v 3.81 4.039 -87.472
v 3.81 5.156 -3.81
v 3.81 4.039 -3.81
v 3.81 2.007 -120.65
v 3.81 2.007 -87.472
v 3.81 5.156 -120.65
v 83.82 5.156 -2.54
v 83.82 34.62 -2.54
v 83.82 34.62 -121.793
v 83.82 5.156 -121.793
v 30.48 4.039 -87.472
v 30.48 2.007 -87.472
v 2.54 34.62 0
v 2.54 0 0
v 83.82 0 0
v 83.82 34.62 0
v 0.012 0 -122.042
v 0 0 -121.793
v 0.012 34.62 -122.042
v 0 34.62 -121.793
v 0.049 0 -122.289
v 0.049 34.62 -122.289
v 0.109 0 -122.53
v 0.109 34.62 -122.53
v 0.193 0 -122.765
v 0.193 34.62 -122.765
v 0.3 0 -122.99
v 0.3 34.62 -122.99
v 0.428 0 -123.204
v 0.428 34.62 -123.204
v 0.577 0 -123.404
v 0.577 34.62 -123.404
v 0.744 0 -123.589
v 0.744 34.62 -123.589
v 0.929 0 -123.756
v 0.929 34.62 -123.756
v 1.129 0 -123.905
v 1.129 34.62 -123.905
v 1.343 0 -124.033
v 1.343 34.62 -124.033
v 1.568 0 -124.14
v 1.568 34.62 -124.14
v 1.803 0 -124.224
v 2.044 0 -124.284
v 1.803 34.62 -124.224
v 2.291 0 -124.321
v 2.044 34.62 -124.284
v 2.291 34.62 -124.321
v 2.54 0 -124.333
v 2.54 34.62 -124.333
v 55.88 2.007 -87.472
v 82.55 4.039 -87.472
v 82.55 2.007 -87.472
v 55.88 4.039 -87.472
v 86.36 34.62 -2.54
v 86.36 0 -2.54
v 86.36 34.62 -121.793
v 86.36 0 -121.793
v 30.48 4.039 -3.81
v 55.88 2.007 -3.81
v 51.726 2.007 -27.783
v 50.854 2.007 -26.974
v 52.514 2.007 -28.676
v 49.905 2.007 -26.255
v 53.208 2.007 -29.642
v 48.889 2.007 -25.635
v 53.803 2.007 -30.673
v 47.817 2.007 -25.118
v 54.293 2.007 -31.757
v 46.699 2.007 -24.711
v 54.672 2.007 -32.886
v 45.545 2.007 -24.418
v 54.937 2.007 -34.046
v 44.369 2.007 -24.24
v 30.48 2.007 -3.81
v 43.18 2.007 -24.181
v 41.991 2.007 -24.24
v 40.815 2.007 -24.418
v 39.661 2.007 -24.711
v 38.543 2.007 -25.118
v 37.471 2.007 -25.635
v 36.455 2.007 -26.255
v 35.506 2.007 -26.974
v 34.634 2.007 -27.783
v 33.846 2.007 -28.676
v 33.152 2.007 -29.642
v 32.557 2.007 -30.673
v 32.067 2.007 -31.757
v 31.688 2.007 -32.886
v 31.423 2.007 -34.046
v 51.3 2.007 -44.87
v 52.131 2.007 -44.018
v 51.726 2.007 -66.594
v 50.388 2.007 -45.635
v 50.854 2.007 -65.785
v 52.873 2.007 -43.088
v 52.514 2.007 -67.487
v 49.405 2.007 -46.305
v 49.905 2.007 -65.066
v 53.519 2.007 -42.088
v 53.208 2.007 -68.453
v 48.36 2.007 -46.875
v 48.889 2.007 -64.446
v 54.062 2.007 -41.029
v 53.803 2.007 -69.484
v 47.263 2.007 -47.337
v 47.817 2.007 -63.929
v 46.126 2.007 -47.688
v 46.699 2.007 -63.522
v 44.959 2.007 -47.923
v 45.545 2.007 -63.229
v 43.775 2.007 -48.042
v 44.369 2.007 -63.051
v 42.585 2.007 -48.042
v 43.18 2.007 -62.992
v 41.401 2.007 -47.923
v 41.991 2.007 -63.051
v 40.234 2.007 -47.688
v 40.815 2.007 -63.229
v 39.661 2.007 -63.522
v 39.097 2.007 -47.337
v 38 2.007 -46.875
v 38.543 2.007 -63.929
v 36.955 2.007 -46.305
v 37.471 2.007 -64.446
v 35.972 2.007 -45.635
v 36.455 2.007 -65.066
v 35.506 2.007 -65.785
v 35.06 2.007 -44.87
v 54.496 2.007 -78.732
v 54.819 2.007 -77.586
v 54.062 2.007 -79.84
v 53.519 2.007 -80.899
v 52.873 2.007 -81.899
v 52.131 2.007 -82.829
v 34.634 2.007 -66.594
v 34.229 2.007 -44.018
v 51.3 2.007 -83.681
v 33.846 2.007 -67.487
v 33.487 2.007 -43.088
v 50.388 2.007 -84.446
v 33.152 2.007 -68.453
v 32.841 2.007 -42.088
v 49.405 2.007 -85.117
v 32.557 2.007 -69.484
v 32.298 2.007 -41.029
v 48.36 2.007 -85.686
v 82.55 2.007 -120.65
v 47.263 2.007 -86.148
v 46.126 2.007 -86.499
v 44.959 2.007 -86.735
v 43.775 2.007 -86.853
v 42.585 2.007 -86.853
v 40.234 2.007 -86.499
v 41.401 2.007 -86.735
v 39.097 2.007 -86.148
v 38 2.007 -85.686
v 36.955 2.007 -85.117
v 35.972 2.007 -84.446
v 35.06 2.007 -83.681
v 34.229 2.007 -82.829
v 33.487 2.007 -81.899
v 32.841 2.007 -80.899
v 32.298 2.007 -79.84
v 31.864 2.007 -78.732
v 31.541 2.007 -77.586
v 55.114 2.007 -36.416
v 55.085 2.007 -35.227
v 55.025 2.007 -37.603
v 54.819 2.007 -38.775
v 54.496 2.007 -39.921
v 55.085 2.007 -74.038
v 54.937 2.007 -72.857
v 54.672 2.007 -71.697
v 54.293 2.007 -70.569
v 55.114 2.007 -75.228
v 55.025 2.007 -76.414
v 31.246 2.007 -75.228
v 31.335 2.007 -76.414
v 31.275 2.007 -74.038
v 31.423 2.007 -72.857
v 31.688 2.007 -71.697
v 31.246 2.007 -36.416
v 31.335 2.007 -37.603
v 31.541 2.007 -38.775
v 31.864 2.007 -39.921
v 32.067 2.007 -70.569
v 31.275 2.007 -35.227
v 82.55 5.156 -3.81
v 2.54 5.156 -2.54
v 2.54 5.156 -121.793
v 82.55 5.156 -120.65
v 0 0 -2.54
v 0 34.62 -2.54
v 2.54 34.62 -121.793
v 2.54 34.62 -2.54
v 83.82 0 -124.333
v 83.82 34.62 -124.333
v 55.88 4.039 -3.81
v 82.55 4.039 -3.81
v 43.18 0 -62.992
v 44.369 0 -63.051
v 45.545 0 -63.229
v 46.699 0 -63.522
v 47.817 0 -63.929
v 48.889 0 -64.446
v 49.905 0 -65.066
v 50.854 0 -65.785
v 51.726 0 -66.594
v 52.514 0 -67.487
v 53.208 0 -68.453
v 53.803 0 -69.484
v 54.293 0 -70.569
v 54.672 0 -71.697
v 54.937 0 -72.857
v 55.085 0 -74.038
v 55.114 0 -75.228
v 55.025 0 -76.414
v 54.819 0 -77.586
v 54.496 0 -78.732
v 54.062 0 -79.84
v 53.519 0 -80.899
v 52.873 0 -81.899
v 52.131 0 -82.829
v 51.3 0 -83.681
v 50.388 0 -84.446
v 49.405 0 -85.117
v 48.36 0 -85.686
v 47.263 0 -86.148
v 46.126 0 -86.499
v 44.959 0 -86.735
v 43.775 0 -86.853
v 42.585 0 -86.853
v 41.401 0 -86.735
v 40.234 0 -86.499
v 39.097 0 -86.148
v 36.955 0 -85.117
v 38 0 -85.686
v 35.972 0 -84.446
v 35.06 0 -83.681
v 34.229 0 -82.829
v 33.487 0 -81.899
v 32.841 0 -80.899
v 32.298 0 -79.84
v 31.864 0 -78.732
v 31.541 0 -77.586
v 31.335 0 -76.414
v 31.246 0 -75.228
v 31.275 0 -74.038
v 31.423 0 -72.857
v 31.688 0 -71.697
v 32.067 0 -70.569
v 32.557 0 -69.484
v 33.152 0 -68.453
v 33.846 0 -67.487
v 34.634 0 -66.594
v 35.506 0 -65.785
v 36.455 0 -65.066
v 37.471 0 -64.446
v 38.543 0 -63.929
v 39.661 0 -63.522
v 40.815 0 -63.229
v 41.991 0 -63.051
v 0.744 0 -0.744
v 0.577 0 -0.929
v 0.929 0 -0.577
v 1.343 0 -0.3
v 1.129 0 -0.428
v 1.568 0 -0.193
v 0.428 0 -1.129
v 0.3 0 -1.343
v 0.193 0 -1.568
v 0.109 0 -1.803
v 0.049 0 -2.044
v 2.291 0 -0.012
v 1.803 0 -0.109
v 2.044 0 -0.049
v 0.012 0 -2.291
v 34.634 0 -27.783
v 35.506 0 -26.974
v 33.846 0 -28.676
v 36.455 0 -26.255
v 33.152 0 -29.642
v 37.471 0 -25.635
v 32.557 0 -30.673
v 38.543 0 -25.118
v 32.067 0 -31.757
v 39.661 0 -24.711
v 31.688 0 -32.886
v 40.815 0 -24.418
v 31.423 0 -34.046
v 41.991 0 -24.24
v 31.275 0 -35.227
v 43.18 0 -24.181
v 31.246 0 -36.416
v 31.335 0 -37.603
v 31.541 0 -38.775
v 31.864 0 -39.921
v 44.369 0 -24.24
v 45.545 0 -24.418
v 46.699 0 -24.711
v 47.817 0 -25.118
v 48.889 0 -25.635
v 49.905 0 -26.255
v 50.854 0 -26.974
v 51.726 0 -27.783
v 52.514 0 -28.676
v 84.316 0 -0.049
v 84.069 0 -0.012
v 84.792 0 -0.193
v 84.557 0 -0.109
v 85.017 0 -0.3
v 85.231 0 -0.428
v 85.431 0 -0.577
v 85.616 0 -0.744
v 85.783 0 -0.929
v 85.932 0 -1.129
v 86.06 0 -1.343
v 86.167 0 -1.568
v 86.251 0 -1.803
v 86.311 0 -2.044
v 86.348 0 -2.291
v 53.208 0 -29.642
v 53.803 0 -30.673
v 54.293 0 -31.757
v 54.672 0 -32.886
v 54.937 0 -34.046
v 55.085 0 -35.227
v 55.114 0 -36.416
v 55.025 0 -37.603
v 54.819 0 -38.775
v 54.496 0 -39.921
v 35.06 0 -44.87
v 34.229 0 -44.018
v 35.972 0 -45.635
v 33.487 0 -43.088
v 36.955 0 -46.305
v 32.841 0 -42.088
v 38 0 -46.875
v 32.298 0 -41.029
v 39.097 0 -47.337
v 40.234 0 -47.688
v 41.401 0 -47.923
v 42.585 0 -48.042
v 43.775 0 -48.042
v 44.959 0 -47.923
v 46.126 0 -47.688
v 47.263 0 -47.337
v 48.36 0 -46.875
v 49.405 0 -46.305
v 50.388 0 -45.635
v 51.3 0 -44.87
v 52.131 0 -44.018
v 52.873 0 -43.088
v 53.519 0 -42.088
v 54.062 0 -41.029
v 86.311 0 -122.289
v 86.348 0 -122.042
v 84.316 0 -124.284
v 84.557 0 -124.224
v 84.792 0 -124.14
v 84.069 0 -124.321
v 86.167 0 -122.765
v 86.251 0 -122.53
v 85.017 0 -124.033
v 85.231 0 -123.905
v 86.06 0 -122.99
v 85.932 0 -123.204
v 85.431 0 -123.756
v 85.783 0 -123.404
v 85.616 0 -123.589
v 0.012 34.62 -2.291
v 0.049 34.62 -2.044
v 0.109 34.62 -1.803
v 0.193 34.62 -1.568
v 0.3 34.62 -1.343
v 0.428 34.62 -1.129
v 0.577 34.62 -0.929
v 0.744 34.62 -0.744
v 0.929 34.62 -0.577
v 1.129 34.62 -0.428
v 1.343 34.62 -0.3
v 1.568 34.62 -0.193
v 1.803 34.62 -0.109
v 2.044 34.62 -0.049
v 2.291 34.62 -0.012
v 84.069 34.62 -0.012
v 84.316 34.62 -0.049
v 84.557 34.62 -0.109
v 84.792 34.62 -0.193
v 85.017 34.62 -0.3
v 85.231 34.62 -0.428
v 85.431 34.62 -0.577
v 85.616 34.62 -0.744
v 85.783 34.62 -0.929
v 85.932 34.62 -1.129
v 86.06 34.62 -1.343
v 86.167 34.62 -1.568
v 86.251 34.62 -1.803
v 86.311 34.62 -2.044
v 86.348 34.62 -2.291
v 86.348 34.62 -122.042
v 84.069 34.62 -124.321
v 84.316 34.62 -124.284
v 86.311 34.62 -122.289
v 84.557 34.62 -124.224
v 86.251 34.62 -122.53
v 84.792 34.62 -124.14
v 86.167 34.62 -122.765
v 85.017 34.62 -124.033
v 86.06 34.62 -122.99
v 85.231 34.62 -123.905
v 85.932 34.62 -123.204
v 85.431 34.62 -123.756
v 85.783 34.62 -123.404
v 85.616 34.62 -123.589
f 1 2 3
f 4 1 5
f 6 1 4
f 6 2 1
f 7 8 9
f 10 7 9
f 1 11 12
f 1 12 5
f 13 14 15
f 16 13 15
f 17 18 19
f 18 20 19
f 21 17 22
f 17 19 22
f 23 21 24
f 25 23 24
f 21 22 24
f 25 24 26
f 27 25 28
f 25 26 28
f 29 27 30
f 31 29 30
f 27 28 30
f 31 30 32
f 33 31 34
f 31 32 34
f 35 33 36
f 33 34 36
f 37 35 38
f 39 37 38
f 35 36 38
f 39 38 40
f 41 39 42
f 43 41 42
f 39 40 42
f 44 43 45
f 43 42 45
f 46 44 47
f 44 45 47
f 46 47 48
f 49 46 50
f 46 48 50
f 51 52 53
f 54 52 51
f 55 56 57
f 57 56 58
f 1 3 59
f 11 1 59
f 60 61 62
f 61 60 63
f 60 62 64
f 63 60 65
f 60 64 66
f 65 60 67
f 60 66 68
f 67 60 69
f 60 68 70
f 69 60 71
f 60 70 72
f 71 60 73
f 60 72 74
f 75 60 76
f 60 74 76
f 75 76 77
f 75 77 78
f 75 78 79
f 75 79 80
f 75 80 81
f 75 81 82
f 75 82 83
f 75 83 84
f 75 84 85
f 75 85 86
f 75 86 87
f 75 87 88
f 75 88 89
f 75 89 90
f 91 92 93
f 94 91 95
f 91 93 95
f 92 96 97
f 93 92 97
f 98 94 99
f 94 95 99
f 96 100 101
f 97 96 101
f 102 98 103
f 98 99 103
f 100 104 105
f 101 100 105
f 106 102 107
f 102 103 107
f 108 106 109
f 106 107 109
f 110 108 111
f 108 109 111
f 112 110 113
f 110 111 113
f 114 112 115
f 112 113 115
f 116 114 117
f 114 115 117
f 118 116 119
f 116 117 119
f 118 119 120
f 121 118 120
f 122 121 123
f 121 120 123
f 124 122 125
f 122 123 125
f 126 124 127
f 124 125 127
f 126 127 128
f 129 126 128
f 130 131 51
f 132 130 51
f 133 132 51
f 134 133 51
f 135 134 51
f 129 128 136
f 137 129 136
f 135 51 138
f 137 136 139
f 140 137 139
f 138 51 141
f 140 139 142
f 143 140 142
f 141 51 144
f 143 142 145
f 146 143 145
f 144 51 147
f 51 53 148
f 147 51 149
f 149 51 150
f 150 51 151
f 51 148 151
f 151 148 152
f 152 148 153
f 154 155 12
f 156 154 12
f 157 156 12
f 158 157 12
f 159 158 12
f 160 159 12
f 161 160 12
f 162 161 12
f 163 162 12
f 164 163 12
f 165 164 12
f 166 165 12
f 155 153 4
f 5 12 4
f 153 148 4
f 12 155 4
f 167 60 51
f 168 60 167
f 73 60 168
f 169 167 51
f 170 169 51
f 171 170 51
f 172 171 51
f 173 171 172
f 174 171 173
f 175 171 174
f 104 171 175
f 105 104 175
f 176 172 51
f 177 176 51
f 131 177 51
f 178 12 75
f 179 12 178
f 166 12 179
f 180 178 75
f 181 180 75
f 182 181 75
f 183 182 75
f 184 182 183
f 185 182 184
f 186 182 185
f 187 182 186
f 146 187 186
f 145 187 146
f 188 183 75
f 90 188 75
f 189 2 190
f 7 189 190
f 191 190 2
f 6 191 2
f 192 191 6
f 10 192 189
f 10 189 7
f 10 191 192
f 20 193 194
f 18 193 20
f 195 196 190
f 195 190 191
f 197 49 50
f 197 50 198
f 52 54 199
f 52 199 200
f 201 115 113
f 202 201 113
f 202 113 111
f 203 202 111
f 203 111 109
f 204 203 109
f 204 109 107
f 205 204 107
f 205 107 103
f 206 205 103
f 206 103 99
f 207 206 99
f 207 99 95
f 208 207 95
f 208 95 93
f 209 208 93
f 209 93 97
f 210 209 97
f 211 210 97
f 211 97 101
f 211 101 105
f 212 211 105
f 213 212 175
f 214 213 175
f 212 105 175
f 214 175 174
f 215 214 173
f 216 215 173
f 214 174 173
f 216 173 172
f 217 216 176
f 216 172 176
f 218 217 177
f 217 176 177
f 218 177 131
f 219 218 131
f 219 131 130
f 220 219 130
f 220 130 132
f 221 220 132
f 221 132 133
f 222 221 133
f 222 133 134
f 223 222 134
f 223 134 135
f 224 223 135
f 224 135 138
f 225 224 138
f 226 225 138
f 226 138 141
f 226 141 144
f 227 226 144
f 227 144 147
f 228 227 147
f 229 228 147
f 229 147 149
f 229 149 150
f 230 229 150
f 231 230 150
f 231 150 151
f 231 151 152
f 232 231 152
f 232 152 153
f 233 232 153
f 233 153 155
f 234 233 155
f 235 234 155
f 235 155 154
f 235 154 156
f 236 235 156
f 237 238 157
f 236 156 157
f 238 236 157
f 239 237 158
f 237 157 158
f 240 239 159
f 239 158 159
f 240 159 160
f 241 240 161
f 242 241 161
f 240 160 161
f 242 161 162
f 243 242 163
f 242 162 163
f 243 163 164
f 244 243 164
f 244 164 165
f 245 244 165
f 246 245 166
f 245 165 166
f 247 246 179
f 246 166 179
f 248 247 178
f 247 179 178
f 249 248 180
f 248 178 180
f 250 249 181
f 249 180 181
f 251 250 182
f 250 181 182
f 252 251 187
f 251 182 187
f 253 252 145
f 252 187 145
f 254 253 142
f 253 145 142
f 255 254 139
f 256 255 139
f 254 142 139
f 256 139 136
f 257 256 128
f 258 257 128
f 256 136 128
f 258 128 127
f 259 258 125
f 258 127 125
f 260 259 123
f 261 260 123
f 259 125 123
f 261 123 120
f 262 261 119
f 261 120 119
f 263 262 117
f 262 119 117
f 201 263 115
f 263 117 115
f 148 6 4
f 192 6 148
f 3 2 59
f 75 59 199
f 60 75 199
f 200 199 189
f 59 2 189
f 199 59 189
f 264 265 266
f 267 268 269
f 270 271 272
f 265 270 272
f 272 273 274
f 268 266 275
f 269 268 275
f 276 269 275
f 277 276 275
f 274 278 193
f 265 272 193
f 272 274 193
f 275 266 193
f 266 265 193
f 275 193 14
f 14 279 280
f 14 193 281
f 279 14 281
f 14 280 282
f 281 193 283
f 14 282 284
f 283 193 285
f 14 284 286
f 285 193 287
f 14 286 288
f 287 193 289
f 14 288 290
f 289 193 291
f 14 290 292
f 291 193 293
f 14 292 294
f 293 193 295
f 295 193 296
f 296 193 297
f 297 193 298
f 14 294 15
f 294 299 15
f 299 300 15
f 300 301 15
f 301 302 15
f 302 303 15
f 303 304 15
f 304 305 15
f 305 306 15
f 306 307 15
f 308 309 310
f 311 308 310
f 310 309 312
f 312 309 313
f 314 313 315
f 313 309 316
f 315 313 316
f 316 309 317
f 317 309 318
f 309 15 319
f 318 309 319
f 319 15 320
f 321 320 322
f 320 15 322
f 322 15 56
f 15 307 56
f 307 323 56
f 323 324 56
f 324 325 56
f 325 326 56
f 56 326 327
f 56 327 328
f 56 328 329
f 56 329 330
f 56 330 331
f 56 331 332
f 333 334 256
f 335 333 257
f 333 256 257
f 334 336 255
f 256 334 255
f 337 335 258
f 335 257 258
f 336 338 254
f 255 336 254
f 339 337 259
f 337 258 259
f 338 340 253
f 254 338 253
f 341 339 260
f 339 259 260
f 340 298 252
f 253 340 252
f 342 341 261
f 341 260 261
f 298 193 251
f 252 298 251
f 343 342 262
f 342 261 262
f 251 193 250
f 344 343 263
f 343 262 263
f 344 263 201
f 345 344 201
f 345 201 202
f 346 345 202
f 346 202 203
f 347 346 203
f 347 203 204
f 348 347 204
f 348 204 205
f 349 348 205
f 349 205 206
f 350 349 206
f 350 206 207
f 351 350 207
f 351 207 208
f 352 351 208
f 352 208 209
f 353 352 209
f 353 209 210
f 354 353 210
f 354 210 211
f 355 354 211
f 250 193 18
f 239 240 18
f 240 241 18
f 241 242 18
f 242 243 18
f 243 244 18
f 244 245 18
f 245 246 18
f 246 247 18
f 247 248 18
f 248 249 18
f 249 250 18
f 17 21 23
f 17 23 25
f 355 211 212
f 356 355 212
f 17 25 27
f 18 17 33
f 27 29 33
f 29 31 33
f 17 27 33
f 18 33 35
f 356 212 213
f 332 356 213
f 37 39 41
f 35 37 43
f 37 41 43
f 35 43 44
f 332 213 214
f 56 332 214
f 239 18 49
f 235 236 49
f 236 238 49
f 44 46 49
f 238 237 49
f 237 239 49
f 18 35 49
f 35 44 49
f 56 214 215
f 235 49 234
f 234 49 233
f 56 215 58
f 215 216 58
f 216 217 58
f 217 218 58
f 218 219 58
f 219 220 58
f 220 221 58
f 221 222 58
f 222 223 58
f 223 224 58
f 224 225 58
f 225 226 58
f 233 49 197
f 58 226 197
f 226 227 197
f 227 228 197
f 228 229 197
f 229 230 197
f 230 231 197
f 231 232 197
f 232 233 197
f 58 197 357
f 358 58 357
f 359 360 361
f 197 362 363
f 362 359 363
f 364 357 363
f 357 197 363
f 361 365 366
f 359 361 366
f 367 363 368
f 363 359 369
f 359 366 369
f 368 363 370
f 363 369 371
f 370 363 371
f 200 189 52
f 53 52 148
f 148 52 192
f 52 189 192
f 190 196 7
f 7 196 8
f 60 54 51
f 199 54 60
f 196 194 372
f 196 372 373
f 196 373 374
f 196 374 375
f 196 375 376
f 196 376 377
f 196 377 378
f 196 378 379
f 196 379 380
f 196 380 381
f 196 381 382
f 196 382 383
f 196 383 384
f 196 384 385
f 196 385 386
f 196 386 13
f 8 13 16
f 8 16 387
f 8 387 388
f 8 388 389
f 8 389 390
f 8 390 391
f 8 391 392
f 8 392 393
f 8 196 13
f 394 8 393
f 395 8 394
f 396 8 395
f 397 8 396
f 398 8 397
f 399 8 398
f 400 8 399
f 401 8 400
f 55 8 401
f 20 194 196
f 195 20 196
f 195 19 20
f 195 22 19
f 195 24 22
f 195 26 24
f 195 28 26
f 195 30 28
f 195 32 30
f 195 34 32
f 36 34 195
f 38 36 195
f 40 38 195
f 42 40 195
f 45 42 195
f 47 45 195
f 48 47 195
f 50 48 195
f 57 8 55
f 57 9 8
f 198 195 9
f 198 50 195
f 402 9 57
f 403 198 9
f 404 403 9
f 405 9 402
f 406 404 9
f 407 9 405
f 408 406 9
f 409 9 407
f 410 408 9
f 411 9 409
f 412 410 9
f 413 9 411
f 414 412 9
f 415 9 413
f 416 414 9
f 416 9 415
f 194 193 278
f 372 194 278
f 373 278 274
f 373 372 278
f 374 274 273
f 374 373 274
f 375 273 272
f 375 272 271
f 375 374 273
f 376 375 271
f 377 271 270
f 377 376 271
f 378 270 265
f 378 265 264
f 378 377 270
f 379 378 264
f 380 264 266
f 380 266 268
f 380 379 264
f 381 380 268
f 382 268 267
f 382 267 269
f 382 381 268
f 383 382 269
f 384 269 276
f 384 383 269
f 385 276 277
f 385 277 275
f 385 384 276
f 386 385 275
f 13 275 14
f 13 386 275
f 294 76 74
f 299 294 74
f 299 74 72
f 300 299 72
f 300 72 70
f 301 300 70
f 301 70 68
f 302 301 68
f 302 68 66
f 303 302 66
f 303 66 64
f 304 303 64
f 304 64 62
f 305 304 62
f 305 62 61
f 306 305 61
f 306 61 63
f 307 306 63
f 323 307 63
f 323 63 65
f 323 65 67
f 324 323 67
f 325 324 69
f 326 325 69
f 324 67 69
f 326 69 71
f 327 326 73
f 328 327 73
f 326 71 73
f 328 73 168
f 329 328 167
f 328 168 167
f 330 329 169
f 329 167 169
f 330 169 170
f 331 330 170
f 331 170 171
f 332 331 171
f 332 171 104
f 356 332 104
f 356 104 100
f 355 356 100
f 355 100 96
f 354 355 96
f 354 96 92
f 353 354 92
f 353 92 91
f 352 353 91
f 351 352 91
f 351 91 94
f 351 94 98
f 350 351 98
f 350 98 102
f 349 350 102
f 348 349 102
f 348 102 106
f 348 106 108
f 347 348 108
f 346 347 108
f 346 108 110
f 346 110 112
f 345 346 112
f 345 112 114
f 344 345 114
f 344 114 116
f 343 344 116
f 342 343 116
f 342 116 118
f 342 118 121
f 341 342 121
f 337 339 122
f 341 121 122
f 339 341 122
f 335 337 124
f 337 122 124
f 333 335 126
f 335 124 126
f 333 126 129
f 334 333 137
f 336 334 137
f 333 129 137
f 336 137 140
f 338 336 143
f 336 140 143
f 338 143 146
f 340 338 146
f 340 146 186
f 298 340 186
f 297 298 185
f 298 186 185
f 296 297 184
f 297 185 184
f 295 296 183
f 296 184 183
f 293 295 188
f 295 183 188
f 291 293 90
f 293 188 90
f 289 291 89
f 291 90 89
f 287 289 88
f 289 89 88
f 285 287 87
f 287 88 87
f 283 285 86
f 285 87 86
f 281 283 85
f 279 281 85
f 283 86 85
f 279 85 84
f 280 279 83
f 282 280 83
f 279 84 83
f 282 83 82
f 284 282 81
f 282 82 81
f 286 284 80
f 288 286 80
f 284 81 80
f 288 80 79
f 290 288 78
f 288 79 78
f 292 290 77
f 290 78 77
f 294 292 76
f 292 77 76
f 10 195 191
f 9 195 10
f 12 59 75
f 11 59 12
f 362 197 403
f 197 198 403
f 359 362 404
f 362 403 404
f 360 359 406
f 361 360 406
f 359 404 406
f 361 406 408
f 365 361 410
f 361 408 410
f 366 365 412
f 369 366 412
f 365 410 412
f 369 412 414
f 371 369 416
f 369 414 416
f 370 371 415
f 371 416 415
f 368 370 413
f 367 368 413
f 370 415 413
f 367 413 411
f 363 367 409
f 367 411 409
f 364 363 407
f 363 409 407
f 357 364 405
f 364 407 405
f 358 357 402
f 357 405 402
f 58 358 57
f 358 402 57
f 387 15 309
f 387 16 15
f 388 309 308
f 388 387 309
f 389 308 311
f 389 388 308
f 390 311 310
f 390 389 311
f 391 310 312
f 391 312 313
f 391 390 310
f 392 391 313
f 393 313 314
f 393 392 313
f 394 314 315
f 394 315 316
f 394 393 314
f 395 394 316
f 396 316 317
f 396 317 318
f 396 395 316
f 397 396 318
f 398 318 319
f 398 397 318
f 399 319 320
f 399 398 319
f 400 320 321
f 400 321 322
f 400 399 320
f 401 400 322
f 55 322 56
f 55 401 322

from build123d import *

# Parameters (mm, degrees)
SKETCH1_W           = 86.36
SKETCH1_H           = 124.333
BOSS_EXTRUDE1_DEPTH = 34.6202
SKETCH3_W           = 78.74
SKETCH3_H           = 116.84
CUT_EXTRUDE1_DEPTH  = 30.5816
SKETCH4_W           = 81.28
SKETCH4_H           = 119.253
CUT_EXTRUDE2_DEPTH  = 29.464
CUT_EXTRUDE3_DEPTH  = 2.032
SKETCH8_R           = 11.938
CUT_EXTRUDE4_DEPTH  = 2.032
FILLET1_R           = 2.54


with BuildPart() as part:
    # Sketch1 → Boss-Extrude1 (new body)
    with BuildSketch(Plane(origin=(0, 0, 0), x_dir=(1, 0, 0), z_dir=(0, 1, 0))):
        with Locations((43.18, 62.1665)):
            Rectangle(SKETCH1_W, SKETCH1_H)
    extrude(amount=BOSS_EXTRUDE1_DEPTH)

    # Sketch3 → Cut-Extrude1 (cut)
    with BuildSketch(Plane(origin=(0, 34.6202, 0), x_dir=(1, 0, 0), z_dir=(0, 1, 0))):
        with Locations((43.18, 62.23)):
            Rectangle(SKETCH3_W, SKETCH3_H)
    extrude(amount=-CUT_EXTRUDE1_DEPTH, mode=Mode.SUBTRACT)

    # Sketch4 → Cut-Extrude2 (cut)
    with BuildSketch(Plane(origin=(0, 34.6202, 0), x_dir=(1, 0, 0), z_dir=(0, 1, 0))):
        with Locations((43.18, 62.1665)):
            Rectangle(SKETCH4_W, SKETCH4_H)
    extrude(amount=-CUT_EXTRUDE2_DEPTH, mode=Mode.SUBTRACT)

    # Sketch6 → Cut-Extrude3 (cut)
    with BuildSketch(Plane(origin=(0, 4.0386, 0), x_dir=(1, 0, 0), z_dir=(0, 1, 0))):
        Polygon((3.81, 120.65), (82.55, 120.65), (82.55, 87.471955448), (55.88, 87.471955448), (55.88, 3.81), (30.48, 3.81), (30.48, 87.471955448), (3.81, 87.471955448), align=None)
    extrude(amount=-CUT_EXTRUDE3_DEPTH, mode=Mode.SUBTRACT)

    # Sketch8 → Cut-Extrude4 (cut)
    with BuildSketch(Plane(origin=(0, 2.0066, 0), x_dir=(1, 0, 0), z_dir=(0, 1, 0))):
        with Locations(Location((43.18, 36.1188, 0), (0, 0, 270))):
            Circle(SKETCH8_R)
        with Locations(Location((43.18, 74.93, 0), (0, 0, 270))):
            Circle(SKETCH8_R)
    extrude(amount=-CUT_EXTRUDE4_DEPTH, mode=Mode.SUBTRACT)

    # Fillet1
    fillet1_edges = [part.edges().sort_by_distance(p)[0] for p in [
        (86.36, 17.3101, 0),
        (0, 17.3101, 0),
        (0, 17.3101, -124.333),
        (86.36, 17.3101, -124.333),
    ]]
    fillet(fillet1_edges, radius=FILLET1_R)


solid = part.part
